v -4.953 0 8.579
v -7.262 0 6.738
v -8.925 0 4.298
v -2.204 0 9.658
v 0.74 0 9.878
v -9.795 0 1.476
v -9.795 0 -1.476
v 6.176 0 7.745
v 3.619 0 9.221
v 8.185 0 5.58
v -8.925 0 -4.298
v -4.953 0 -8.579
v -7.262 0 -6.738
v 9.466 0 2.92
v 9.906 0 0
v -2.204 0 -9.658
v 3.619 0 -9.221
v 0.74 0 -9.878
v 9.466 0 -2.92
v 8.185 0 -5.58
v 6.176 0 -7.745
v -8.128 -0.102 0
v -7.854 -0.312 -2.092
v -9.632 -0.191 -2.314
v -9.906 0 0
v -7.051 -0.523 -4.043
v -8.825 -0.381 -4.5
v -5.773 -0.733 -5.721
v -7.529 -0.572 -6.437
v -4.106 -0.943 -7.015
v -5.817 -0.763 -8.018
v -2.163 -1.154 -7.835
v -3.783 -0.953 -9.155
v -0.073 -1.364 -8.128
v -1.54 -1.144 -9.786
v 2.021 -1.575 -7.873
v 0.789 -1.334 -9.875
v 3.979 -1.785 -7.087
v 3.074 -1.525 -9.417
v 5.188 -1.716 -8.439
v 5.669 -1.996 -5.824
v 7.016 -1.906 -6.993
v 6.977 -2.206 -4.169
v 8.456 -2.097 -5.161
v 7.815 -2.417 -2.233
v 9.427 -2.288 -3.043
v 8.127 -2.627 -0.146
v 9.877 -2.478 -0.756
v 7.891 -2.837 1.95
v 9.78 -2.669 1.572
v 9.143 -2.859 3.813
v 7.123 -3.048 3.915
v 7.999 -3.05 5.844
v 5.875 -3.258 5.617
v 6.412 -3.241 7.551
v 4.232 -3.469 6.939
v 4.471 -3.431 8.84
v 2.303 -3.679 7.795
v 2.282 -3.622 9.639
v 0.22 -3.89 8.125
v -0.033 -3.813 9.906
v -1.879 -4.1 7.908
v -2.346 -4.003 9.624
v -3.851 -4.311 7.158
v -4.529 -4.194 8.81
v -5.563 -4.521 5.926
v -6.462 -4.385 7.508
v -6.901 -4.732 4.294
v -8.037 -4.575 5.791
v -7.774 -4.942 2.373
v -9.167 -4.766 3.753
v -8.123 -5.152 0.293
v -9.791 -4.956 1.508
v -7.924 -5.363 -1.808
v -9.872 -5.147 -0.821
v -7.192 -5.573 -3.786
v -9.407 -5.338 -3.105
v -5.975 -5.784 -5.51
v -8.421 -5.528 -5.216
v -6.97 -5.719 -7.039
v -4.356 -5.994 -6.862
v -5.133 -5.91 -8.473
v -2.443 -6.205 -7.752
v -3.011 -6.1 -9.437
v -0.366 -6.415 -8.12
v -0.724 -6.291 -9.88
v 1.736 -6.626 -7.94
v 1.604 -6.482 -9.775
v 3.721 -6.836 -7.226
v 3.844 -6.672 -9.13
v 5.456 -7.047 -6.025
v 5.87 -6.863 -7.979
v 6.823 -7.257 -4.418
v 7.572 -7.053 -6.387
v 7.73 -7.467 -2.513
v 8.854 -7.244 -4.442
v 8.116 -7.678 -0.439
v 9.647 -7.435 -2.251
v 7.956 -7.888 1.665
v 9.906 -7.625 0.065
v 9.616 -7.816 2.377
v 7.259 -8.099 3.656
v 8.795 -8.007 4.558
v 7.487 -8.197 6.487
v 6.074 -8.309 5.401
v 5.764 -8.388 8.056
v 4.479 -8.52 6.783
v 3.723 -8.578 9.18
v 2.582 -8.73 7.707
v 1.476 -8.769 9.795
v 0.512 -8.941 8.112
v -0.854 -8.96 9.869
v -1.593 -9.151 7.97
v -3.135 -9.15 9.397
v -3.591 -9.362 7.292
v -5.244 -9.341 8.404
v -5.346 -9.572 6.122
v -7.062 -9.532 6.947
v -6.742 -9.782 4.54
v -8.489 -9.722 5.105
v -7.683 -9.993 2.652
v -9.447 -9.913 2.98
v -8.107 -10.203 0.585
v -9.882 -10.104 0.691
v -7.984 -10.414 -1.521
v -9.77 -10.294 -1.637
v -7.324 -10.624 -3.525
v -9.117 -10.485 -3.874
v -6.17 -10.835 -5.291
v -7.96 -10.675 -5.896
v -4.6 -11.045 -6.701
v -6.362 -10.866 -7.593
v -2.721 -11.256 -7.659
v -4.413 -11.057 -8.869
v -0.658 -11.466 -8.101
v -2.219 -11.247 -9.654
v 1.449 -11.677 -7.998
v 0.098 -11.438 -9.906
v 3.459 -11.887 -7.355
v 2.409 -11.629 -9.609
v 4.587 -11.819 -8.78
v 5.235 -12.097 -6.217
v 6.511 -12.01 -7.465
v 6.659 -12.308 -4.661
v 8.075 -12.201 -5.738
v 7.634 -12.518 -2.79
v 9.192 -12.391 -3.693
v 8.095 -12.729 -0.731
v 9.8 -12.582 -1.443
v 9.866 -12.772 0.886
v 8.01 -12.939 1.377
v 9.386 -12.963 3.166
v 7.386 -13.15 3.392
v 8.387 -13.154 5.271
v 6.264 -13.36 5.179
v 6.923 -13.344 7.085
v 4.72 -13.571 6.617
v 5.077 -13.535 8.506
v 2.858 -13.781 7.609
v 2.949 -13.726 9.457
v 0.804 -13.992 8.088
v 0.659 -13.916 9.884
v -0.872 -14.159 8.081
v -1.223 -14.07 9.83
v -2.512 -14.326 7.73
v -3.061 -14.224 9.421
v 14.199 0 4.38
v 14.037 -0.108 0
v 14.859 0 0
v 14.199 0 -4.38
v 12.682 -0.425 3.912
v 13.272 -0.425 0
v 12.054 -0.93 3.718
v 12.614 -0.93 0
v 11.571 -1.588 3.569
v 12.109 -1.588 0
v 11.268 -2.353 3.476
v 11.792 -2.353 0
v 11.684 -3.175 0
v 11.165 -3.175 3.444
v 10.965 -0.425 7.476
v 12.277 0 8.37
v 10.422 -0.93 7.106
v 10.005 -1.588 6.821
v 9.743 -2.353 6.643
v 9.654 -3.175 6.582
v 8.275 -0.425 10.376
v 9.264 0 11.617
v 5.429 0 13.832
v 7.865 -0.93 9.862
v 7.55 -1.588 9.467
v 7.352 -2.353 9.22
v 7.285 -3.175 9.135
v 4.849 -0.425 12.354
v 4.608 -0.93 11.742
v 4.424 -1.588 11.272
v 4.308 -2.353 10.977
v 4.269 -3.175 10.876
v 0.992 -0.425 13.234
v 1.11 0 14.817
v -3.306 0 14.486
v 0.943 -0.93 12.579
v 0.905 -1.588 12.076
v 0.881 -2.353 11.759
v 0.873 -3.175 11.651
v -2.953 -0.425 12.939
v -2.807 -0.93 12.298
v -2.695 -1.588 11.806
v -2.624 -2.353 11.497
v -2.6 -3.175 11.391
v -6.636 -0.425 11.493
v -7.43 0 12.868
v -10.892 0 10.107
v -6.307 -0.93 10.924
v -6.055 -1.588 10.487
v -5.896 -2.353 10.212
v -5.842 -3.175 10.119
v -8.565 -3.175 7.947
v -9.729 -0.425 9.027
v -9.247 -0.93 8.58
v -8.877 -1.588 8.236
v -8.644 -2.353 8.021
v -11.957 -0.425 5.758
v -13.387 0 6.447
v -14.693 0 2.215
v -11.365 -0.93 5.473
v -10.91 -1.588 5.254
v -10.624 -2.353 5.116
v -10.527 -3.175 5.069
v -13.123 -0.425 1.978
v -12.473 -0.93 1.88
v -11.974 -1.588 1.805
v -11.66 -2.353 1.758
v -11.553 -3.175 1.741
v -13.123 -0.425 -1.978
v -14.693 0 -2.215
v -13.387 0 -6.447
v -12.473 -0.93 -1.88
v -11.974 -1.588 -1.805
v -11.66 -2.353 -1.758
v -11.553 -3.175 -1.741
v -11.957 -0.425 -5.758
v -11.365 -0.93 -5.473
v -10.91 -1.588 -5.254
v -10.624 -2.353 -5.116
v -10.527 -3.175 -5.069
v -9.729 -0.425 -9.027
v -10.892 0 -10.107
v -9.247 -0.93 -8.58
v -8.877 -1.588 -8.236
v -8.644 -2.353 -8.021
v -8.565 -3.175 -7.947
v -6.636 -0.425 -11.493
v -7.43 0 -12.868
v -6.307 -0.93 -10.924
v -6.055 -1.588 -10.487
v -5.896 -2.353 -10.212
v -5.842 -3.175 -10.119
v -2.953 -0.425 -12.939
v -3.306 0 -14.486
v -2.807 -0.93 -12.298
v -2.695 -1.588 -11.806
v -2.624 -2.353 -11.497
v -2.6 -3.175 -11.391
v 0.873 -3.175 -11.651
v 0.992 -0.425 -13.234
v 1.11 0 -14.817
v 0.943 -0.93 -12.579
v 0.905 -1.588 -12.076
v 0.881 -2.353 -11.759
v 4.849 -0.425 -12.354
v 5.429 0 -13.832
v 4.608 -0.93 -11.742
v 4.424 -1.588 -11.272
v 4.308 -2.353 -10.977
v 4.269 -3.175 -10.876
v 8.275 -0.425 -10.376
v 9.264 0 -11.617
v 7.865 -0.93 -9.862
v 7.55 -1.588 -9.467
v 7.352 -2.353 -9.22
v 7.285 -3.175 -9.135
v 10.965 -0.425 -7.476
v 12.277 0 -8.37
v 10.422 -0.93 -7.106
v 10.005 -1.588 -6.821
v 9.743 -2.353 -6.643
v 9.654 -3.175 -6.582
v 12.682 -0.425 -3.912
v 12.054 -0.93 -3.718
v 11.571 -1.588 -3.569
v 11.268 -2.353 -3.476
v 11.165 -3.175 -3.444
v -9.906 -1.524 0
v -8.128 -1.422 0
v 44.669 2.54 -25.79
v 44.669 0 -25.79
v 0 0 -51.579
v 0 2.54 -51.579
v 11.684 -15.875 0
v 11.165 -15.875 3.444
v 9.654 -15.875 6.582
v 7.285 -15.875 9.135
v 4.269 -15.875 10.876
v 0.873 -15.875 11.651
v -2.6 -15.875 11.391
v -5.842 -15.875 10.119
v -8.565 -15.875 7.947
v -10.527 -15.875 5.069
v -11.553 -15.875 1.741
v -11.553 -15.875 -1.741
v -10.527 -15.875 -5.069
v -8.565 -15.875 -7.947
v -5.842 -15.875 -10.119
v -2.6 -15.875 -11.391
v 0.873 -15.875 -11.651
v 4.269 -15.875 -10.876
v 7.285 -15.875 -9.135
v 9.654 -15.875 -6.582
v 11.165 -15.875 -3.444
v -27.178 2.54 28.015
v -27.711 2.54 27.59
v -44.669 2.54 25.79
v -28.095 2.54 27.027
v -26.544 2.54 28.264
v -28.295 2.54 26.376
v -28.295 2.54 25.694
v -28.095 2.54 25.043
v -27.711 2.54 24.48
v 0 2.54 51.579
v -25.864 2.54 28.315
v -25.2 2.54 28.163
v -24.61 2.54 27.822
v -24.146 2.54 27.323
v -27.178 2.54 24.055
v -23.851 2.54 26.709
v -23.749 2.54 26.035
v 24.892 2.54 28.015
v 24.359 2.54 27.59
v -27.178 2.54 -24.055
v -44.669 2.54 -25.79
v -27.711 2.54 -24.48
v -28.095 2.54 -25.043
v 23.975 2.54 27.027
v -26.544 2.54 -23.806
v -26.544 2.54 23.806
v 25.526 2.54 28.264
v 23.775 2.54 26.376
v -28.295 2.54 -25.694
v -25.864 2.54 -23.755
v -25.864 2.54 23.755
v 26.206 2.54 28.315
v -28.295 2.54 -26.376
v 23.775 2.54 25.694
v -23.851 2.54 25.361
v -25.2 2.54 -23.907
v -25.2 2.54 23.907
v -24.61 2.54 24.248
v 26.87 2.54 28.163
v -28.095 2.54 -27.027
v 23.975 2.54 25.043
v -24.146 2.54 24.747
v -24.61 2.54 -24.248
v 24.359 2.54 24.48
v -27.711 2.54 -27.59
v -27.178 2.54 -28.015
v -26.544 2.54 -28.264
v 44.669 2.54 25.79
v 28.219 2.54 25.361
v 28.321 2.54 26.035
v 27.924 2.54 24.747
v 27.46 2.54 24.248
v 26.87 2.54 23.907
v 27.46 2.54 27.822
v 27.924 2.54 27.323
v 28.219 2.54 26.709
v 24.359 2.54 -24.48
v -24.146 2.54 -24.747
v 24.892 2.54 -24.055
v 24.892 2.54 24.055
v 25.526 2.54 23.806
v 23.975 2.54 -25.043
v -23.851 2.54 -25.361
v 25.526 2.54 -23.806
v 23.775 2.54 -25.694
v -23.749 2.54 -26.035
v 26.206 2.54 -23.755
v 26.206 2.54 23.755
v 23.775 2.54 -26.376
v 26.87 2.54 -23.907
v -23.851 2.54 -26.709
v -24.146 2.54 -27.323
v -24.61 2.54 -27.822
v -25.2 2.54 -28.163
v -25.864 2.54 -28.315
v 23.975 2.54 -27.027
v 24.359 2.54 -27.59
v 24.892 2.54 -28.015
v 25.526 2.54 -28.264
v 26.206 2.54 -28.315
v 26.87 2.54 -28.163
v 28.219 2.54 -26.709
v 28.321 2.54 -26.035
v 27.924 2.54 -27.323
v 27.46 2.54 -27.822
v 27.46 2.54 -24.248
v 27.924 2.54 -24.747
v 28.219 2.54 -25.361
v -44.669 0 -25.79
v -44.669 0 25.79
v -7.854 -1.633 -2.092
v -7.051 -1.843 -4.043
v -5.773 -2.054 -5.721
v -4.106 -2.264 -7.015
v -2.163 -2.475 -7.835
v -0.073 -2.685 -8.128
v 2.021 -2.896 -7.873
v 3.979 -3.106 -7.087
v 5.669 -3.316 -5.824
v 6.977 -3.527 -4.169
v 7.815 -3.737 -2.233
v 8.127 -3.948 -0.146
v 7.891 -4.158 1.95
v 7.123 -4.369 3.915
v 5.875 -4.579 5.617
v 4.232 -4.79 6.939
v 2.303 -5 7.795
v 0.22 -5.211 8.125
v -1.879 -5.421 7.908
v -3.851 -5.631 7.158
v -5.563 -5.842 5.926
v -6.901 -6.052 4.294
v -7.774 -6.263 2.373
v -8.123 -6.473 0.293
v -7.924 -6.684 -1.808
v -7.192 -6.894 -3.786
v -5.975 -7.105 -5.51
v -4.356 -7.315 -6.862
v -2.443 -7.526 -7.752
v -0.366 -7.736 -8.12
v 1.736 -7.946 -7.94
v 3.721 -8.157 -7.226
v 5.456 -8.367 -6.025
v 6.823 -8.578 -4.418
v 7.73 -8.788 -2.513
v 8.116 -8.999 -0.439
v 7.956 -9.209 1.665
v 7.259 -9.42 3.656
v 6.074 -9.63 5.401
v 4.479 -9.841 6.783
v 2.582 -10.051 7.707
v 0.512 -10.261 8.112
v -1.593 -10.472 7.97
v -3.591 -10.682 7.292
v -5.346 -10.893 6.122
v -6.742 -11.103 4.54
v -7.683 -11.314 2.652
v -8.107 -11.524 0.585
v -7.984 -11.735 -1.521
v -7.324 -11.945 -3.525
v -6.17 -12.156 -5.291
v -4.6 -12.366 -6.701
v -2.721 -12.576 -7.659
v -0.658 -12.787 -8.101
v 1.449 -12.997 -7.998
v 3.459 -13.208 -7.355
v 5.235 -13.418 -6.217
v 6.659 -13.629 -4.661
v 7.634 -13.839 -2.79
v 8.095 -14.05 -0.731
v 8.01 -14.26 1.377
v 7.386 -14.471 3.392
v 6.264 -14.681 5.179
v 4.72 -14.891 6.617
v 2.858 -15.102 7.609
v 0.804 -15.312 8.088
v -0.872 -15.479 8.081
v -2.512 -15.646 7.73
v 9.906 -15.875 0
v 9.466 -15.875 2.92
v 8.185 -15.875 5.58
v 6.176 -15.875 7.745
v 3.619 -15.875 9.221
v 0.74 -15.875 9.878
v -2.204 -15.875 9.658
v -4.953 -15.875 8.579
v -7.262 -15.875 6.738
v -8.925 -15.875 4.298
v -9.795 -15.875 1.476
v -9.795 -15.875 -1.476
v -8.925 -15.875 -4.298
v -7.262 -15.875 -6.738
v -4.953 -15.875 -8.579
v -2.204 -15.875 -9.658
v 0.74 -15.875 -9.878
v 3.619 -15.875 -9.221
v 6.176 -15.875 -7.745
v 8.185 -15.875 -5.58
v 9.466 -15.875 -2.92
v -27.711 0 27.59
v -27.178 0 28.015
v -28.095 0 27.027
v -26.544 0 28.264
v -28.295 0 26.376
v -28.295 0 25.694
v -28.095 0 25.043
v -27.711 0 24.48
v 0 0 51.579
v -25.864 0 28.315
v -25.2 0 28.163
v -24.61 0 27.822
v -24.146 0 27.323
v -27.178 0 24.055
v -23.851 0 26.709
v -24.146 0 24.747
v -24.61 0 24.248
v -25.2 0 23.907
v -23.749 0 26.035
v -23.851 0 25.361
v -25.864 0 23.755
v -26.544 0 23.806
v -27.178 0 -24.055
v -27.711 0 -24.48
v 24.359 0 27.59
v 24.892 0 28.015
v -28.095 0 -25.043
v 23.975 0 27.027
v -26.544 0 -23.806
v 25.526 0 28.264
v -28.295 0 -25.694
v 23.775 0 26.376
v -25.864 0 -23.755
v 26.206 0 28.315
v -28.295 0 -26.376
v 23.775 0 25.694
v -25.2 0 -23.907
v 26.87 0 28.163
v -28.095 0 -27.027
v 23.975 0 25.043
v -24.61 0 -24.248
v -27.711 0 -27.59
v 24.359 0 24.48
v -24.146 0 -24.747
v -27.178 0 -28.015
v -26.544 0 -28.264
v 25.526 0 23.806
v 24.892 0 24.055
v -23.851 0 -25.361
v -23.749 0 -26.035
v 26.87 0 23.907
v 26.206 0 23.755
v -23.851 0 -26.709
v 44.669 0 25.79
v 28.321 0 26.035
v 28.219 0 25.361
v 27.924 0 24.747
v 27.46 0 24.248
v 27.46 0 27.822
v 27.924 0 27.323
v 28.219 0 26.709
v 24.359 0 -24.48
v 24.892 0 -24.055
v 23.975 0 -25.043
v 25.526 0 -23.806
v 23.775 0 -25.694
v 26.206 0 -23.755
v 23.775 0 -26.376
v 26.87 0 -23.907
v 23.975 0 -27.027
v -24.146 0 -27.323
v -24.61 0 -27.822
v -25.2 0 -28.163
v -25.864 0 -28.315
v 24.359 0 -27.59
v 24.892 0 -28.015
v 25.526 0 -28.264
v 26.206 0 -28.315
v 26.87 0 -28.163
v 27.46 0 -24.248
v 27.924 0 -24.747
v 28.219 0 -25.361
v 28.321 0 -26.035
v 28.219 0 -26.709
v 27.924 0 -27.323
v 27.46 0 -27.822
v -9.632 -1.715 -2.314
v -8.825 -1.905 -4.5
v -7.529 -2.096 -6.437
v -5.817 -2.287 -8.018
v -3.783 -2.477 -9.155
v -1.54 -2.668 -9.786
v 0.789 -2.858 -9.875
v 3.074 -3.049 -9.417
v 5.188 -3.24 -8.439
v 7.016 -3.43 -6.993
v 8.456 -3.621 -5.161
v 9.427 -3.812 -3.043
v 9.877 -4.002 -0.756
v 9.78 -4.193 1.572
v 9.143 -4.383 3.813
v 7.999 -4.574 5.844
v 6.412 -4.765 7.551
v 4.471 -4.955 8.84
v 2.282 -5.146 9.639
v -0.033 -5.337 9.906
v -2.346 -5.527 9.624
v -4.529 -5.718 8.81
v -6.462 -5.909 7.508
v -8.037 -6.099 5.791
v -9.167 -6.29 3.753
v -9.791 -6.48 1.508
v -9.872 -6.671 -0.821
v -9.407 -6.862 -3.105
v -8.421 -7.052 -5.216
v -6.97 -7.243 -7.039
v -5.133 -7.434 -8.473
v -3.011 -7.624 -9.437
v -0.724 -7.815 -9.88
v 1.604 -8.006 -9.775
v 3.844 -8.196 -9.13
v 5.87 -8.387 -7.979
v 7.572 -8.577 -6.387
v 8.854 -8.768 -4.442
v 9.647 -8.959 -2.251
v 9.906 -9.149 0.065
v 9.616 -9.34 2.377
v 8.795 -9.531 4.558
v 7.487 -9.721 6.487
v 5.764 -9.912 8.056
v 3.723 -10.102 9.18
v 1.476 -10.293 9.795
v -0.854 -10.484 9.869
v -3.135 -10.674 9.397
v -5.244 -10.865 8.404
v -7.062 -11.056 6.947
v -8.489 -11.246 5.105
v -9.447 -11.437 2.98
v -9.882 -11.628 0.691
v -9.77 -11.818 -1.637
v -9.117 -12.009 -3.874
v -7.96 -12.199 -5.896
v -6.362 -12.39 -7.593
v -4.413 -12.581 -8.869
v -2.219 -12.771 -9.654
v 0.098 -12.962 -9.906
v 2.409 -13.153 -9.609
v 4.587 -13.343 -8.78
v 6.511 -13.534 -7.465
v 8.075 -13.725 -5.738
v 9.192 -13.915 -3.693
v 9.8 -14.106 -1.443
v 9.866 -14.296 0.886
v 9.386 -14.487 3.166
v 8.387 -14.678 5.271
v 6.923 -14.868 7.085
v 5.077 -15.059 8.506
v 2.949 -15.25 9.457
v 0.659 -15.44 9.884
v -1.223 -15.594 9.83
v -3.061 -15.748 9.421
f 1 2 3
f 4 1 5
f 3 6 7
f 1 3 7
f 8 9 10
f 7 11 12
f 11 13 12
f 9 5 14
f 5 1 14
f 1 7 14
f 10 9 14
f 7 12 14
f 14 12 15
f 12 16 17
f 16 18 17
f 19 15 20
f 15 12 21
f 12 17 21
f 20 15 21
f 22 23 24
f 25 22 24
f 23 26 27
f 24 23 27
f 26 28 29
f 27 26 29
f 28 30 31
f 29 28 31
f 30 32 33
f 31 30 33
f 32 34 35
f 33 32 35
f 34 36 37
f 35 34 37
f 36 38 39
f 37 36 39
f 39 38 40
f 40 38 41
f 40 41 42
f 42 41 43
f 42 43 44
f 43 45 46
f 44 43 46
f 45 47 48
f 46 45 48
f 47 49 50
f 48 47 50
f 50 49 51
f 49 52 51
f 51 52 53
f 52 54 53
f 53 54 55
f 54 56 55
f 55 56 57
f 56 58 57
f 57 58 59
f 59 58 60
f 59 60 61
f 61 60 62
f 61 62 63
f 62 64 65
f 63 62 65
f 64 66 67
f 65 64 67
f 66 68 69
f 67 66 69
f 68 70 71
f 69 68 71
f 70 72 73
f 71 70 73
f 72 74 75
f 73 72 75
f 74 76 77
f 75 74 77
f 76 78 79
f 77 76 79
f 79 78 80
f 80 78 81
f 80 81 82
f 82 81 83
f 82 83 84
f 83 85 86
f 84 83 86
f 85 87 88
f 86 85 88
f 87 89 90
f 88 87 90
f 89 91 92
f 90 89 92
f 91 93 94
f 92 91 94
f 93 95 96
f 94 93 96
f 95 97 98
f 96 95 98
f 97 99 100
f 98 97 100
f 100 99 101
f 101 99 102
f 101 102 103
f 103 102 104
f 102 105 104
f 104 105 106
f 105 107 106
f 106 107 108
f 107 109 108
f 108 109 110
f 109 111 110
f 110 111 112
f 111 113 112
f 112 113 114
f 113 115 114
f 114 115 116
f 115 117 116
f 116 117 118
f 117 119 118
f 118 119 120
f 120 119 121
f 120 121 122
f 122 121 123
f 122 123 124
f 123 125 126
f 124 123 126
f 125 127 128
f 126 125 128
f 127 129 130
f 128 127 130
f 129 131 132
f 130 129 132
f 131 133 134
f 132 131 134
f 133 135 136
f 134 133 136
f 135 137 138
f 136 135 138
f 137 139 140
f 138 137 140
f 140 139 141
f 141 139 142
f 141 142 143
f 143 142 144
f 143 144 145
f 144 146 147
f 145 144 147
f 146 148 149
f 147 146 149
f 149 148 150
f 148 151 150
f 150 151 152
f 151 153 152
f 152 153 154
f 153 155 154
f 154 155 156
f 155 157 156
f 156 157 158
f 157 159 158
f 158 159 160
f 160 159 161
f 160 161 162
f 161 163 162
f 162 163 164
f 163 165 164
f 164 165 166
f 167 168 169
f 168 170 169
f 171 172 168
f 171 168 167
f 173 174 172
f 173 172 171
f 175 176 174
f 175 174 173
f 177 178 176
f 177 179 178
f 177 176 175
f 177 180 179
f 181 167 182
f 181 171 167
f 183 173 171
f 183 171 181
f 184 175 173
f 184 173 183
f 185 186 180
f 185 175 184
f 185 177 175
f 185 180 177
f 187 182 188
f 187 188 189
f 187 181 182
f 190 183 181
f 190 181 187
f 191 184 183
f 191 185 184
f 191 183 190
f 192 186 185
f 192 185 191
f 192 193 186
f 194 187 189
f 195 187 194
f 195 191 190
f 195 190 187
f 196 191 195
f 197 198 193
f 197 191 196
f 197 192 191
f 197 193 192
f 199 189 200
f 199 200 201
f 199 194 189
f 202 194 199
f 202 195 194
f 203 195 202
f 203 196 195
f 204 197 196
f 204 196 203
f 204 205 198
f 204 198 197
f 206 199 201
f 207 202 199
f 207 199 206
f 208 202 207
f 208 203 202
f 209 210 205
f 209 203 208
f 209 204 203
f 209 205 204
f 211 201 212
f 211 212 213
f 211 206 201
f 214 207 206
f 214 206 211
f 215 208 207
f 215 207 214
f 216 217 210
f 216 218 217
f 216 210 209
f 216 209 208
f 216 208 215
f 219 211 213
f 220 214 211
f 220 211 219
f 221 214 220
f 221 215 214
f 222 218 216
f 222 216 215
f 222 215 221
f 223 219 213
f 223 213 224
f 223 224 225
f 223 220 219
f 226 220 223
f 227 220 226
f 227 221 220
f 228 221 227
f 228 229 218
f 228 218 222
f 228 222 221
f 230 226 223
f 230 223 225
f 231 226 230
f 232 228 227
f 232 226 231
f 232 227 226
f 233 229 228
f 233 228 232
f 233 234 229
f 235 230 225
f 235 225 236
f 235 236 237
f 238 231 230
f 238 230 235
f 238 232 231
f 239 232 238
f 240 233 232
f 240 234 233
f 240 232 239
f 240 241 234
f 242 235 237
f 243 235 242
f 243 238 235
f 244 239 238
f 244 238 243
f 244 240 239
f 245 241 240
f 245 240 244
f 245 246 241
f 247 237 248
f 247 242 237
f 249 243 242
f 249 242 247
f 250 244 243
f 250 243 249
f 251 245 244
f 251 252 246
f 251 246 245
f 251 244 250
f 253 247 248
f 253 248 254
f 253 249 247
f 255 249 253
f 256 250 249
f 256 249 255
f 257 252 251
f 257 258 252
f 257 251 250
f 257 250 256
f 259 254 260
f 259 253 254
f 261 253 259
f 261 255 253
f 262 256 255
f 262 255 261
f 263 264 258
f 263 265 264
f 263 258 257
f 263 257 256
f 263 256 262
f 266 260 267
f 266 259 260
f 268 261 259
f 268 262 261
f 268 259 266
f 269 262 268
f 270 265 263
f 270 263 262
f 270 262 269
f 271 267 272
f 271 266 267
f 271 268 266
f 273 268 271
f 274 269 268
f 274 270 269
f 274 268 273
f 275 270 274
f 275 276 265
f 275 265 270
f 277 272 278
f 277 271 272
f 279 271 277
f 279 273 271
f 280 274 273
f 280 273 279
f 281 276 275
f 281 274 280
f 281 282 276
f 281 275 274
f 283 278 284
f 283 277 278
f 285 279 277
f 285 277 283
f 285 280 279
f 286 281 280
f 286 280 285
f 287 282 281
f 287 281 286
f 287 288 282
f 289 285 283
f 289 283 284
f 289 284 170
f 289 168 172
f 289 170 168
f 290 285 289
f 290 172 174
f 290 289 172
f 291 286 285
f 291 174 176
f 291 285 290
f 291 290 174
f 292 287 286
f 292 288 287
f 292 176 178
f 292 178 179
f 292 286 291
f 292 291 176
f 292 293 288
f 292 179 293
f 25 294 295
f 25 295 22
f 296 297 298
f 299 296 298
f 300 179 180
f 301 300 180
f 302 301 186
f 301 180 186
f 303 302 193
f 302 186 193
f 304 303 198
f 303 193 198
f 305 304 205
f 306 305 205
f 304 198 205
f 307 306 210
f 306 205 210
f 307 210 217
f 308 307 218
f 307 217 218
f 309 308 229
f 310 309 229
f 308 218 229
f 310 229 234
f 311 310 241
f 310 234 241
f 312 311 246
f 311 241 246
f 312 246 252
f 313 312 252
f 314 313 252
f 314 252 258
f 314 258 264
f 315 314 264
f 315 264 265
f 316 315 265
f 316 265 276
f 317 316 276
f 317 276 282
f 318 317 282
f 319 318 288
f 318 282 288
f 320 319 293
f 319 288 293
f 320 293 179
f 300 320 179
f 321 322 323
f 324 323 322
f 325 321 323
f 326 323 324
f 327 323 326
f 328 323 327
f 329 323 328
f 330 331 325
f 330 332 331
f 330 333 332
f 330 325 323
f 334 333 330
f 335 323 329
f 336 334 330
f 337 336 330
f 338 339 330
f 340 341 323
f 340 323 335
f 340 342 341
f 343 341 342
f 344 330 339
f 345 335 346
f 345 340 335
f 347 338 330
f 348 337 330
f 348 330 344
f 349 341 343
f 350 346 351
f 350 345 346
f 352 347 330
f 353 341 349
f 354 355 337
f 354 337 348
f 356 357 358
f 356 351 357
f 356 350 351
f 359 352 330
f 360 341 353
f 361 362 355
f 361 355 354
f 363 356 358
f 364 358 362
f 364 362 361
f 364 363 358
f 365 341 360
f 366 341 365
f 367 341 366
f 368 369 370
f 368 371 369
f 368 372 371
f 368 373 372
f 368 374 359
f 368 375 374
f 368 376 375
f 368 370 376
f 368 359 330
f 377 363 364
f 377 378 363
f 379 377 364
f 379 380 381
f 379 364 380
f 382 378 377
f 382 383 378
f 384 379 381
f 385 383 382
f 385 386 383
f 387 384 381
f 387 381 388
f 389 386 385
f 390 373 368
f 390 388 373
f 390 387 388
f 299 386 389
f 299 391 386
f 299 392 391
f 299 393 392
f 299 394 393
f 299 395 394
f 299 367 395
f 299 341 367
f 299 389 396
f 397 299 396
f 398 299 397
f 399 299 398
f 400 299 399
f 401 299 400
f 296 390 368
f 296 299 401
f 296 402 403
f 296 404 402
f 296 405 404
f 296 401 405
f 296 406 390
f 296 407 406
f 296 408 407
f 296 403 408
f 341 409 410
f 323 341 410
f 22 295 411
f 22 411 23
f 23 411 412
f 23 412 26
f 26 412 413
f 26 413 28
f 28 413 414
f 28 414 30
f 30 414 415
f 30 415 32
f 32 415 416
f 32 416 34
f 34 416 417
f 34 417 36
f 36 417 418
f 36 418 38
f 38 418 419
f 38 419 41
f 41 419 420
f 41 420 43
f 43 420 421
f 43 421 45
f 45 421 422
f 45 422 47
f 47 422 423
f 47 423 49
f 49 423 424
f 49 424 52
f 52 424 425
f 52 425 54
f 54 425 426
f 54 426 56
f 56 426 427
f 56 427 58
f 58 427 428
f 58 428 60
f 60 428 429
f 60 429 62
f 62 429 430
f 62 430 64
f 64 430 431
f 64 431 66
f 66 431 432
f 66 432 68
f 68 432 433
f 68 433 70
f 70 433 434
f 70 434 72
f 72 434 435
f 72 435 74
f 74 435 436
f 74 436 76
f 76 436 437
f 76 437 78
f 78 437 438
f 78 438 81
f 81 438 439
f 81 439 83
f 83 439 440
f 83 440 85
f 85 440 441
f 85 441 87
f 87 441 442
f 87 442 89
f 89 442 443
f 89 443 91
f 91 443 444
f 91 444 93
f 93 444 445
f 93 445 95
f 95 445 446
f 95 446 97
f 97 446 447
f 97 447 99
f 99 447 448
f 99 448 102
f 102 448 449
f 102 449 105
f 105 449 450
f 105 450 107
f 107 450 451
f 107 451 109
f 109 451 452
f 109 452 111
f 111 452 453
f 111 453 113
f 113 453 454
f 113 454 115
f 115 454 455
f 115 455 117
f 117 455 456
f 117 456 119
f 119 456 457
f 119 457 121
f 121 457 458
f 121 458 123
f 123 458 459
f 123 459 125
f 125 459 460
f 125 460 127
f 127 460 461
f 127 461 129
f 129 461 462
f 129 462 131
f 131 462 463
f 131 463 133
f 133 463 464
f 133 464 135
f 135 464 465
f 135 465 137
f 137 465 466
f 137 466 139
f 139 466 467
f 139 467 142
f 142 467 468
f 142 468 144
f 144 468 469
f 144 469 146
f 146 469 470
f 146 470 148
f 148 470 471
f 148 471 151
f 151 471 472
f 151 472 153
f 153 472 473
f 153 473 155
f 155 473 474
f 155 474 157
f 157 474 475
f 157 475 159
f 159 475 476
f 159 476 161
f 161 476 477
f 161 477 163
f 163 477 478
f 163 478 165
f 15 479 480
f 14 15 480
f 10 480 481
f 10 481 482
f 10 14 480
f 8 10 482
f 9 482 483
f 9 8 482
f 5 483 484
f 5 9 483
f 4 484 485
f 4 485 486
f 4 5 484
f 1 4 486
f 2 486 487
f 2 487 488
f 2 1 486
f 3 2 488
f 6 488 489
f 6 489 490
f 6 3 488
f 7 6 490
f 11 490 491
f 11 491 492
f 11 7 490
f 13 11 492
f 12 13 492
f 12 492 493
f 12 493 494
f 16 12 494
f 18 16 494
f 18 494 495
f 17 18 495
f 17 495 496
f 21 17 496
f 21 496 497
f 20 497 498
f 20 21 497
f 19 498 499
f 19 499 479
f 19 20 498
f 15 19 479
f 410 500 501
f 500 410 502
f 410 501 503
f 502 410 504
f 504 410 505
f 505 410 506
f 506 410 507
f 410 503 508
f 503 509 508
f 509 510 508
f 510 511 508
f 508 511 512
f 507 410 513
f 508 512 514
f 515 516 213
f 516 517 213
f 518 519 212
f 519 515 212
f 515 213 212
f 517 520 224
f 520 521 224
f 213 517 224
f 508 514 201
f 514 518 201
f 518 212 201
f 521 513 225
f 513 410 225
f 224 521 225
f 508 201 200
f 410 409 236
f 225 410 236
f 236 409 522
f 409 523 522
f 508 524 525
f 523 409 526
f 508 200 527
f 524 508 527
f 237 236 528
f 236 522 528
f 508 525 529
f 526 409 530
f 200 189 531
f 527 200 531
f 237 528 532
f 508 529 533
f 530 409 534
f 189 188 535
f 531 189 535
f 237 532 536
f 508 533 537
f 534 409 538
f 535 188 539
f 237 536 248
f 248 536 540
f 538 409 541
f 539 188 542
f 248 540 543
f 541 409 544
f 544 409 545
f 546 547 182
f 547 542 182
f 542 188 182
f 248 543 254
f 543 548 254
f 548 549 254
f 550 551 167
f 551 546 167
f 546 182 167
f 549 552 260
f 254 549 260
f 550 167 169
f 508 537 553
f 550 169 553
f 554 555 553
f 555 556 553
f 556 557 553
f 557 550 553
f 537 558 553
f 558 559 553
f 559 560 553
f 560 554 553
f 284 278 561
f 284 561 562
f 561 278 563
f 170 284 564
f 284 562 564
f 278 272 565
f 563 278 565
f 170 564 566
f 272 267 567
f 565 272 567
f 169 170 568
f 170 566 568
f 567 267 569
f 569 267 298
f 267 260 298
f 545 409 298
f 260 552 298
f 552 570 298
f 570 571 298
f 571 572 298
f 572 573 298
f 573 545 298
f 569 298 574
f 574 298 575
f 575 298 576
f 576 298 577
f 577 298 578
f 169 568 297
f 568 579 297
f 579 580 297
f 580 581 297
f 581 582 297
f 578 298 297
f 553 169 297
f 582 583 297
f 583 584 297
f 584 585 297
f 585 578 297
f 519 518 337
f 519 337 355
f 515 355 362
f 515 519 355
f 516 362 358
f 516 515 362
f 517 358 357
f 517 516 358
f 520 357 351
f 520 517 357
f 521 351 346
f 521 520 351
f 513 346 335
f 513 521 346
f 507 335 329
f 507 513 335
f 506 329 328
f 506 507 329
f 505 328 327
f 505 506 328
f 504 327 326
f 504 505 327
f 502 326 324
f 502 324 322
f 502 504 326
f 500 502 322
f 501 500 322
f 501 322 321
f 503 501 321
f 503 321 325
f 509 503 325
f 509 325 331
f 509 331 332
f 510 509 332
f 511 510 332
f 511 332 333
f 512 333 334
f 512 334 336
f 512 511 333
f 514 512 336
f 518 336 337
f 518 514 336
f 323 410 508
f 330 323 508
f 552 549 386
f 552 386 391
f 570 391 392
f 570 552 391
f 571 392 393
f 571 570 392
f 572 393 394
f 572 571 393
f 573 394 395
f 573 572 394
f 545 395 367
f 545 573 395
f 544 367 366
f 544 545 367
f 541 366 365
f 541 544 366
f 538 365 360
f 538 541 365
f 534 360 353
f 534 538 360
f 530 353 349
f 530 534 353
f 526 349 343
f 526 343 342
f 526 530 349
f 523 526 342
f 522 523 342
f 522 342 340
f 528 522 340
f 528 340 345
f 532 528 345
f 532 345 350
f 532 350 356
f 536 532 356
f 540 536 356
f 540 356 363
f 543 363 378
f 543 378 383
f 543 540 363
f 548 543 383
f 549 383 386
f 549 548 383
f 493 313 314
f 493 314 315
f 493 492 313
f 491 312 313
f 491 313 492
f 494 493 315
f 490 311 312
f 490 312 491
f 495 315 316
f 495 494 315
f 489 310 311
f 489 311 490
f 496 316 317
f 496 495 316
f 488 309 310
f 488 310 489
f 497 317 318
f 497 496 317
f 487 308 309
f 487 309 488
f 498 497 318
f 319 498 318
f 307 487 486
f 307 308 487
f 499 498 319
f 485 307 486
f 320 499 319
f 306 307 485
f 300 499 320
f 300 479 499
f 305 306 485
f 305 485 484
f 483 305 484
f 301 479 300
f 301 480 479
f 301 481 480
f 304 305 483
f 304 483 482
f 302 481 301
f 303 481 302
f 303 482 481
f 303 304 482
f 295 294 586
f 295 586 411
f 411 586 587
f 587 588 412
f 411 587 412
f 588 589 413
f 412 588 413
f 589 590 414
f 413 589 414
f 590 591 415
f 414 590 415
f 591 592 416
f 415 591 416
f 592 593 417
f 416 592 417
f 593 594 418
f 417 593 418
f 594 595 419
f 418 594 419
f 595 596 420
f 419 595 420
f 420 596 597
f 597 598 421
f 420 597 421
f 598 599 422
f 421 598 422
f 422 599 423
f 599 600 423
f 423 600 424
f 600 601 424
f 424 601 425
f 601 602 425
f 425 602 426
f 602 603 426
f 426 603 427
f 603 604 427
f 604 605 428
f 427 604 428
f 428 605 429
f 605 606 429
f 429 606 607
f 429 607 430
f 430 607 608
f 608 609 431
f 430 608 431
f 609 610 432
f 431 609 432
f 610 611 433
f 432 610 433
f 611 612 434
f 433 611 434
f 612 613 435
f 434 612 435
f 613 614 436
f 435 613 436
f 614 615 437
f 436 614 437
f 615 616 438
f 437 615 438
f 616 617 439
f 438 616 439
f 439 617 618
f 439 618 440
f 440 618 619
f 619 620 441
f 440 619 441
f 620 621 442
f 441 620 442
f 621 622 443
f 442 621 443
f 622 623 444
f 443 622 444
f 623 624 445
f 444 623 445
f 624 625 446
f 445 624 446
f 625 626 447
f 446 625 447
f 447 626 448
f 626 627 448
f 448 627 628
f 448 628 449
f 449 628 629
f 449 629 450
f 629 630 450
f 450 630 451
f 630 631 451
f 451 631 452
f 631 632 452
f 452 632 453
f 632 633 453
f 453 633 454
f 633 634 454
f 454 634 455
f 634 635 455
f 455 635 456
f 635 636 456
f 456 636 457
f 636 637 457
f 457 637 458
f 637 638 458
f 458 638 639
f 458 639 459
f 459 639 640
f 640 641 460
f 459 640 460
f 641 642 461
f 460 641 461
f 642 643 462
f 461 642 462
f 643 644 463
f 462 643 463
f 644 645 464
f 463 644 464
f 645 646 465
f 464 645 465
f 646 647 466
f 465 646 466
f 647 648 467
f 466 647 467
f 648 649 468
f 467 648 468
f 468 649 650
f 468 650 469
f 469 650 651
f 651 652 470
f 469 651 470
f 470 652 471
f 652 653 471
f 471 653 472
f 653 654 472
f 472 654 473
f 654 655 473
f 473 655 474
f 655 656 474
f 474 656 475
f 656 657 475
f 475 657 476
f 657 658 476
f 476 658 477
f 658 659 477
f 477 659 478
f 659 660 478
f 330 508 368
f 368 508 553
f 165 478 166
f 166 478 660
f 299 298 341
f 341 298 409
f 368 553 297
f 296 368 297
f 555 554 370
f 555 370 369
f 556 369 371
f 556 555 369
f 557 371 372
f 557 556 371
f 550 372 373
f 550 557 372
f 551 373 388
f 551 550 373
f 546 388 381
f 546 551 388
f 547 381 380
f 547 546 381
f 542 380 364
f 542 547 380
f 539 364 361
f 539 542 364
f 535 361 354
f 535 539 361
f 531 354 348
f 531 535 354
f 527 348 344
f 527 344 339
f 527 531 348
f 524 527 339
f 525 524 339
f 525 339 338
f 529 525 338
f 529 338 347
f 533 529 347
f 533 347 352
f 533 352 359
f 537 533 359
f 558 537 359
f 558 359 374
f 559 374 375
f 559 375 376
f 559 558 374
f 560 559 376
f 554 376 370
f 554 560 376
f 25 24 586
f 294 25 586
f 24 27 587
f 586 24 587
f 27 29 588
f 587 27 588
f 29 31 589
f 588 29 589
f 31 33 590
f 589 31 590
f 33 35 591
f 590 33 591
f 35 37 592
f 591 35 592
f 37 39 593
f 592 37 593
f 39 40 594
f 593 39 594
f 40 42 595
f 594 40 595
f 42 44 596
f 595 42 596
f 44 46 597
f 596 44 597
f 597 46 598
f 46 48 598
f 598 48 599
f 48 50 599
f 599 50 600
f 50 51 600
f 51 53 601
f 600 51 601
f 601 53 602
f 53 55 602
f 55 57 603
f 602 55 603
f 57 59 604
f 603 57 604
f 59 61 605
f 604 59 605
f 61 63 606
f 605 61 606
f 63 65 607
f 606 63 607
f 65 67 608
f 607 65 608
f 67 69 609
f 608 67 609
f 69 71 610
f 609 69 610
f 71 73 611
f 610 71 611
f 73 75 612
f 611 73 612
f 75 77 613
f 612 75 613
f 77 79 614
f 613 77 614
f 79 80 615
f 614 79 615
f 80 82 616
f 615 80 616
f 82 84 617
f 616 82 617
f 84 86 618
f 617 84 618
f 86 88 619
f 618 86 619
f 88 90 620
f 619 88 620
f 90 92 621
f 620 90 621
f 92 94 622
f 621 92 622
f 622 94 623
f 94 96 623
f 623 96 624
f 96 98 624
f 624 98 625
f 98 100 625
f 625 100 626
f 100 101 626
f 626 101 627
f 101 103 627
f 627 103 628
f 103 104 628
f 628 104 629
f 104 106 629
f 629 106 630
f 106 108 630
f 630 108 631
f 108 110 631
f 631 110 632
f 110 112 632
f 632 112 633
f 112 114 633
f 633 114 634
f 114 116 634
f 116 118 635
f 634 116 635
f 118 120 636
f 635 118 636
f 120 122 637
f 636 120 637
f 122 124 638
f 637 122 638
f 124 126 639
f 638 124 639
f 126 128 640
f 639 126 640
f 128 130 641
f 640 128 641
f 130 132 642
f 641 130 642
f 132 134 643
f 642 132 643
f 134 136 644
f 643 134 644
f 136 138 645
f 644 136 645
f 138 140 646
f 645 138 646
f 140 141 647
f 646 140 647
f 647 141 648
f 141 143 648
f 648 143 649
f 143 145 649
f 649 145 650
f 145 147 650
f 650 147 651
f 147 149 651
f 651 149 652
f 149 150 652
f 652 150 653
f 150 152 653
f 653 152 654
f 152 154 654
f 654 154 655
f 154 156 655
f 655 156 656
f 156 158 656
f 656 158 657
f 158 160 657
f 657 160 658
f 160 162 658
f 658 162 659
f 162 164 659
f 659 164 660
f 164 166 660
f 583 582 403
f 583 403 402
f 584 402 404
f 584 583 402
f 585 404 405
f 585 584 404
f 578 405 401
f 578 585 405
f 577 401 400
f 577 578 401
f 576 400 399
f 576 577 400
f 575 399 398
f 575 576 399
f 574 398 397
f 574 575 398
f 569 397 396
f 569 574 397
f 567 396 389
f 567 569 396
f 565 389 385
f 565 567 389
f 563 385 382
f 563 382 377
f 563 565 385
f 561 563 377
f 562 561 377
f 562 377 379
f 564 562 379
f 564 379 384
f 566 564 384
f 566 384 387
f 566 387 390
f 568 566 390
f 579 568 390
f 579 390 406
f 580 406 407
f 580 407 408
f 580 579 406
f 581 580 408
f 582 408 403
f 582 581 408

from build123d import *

# Parameters (mm, degrees)
SKETCH1_R           = 2.286
BOSS_EXTRUDE1_DEPTH = 2.54
SKETCH2_R           = 11.684
SKETCH2_R_2         = 9.906
BOSS_EXTRUDE2_DEPTH = 15.875
FILLET1_R           = 3.175
SWEEP2_PITCH        = 5.08
SWEEP2_HEIGHT       = 14.224
SWEEP2_RADIUS       = 9.906
SWEEP2_START_ANGLE  = -90


with BuildPart() as part:
    # Sketch1 → Boss-Extrude1 (new body)
    with BuildSketch(Plane(origin=(0, 0, 0), x_dir=(1, 0, 0), z_dir=(0, 1, 0))):
        Polygon((0, 51.579152228), (-44.668856135, 25.789576114), (-44.668856135, -25.789576114), (0, -51.579152228), (44.668856135, -25.789576114), (44.668856135, 25.789576114), align=None)
        with Locations((-26.035, 26.035)):
            Circle(SKETCH1_R, mode=Mode.SUBTRACT)
        with Locations((26.035, 26.035)):
            Circle(SKETCH1_R, mode=Mode.SUBTRACT)
        with Locations((26.035, -26.035)):
            Circle(SKETCH1_R, mode=Mode.SUBTRACT)
        with Locations((-26.035, -26.035)):
            Circle(SKETCH1_R, mode=Mode.SUBTRACT)
    extrude(amount=BOSS_EXTRUDE1_DEPTH)

    # Sketch2 → Boss-Extrude2 (add)
    with BuildSketch(Plane.XZ):
        Circle(SKETCH2_R)
        Circle(SKETCH2_R_2, mode=Mode.SUBTRACT)
    extrude(amount=BOSS_EXTRUDE2_DEPTH)

    # Fillet1
    fillet1_edges = [part.edges().sort_by_distance(p)[0] for p in [
        (-11.684, 0, 0),
    ]]
    fillet(fillet1_edges, radius=FILLET1_R)


with BuildPart() as body_2:
    # Sweep2: sweep along a helix
    with BuildLine() as sweep2_path:
        add(Helix(SWEEP2_PITCH, SWEEP2_HEIGHT, SWEEP2_RADIUS, center=(0, 0, 0), direction=(0, -1, 0), mode=Mode.PRIVATE).rotate(Axis((0, 0, 0), (0, -1, 0)), SWEEP2_START_ANGLE))
    # Sketch4 → Sweep2 (sweep)
    with BuildSketch(Plane.XY):
        Polygon((-9.906, -1.524), (-8.128, -1.4224), (-8.128, -0.1016), (-9.906, 0), align=None)
    sweep(path=sweep2_path.line, is_frenet=True)


solid = Compound([part.part, body_2.part])
